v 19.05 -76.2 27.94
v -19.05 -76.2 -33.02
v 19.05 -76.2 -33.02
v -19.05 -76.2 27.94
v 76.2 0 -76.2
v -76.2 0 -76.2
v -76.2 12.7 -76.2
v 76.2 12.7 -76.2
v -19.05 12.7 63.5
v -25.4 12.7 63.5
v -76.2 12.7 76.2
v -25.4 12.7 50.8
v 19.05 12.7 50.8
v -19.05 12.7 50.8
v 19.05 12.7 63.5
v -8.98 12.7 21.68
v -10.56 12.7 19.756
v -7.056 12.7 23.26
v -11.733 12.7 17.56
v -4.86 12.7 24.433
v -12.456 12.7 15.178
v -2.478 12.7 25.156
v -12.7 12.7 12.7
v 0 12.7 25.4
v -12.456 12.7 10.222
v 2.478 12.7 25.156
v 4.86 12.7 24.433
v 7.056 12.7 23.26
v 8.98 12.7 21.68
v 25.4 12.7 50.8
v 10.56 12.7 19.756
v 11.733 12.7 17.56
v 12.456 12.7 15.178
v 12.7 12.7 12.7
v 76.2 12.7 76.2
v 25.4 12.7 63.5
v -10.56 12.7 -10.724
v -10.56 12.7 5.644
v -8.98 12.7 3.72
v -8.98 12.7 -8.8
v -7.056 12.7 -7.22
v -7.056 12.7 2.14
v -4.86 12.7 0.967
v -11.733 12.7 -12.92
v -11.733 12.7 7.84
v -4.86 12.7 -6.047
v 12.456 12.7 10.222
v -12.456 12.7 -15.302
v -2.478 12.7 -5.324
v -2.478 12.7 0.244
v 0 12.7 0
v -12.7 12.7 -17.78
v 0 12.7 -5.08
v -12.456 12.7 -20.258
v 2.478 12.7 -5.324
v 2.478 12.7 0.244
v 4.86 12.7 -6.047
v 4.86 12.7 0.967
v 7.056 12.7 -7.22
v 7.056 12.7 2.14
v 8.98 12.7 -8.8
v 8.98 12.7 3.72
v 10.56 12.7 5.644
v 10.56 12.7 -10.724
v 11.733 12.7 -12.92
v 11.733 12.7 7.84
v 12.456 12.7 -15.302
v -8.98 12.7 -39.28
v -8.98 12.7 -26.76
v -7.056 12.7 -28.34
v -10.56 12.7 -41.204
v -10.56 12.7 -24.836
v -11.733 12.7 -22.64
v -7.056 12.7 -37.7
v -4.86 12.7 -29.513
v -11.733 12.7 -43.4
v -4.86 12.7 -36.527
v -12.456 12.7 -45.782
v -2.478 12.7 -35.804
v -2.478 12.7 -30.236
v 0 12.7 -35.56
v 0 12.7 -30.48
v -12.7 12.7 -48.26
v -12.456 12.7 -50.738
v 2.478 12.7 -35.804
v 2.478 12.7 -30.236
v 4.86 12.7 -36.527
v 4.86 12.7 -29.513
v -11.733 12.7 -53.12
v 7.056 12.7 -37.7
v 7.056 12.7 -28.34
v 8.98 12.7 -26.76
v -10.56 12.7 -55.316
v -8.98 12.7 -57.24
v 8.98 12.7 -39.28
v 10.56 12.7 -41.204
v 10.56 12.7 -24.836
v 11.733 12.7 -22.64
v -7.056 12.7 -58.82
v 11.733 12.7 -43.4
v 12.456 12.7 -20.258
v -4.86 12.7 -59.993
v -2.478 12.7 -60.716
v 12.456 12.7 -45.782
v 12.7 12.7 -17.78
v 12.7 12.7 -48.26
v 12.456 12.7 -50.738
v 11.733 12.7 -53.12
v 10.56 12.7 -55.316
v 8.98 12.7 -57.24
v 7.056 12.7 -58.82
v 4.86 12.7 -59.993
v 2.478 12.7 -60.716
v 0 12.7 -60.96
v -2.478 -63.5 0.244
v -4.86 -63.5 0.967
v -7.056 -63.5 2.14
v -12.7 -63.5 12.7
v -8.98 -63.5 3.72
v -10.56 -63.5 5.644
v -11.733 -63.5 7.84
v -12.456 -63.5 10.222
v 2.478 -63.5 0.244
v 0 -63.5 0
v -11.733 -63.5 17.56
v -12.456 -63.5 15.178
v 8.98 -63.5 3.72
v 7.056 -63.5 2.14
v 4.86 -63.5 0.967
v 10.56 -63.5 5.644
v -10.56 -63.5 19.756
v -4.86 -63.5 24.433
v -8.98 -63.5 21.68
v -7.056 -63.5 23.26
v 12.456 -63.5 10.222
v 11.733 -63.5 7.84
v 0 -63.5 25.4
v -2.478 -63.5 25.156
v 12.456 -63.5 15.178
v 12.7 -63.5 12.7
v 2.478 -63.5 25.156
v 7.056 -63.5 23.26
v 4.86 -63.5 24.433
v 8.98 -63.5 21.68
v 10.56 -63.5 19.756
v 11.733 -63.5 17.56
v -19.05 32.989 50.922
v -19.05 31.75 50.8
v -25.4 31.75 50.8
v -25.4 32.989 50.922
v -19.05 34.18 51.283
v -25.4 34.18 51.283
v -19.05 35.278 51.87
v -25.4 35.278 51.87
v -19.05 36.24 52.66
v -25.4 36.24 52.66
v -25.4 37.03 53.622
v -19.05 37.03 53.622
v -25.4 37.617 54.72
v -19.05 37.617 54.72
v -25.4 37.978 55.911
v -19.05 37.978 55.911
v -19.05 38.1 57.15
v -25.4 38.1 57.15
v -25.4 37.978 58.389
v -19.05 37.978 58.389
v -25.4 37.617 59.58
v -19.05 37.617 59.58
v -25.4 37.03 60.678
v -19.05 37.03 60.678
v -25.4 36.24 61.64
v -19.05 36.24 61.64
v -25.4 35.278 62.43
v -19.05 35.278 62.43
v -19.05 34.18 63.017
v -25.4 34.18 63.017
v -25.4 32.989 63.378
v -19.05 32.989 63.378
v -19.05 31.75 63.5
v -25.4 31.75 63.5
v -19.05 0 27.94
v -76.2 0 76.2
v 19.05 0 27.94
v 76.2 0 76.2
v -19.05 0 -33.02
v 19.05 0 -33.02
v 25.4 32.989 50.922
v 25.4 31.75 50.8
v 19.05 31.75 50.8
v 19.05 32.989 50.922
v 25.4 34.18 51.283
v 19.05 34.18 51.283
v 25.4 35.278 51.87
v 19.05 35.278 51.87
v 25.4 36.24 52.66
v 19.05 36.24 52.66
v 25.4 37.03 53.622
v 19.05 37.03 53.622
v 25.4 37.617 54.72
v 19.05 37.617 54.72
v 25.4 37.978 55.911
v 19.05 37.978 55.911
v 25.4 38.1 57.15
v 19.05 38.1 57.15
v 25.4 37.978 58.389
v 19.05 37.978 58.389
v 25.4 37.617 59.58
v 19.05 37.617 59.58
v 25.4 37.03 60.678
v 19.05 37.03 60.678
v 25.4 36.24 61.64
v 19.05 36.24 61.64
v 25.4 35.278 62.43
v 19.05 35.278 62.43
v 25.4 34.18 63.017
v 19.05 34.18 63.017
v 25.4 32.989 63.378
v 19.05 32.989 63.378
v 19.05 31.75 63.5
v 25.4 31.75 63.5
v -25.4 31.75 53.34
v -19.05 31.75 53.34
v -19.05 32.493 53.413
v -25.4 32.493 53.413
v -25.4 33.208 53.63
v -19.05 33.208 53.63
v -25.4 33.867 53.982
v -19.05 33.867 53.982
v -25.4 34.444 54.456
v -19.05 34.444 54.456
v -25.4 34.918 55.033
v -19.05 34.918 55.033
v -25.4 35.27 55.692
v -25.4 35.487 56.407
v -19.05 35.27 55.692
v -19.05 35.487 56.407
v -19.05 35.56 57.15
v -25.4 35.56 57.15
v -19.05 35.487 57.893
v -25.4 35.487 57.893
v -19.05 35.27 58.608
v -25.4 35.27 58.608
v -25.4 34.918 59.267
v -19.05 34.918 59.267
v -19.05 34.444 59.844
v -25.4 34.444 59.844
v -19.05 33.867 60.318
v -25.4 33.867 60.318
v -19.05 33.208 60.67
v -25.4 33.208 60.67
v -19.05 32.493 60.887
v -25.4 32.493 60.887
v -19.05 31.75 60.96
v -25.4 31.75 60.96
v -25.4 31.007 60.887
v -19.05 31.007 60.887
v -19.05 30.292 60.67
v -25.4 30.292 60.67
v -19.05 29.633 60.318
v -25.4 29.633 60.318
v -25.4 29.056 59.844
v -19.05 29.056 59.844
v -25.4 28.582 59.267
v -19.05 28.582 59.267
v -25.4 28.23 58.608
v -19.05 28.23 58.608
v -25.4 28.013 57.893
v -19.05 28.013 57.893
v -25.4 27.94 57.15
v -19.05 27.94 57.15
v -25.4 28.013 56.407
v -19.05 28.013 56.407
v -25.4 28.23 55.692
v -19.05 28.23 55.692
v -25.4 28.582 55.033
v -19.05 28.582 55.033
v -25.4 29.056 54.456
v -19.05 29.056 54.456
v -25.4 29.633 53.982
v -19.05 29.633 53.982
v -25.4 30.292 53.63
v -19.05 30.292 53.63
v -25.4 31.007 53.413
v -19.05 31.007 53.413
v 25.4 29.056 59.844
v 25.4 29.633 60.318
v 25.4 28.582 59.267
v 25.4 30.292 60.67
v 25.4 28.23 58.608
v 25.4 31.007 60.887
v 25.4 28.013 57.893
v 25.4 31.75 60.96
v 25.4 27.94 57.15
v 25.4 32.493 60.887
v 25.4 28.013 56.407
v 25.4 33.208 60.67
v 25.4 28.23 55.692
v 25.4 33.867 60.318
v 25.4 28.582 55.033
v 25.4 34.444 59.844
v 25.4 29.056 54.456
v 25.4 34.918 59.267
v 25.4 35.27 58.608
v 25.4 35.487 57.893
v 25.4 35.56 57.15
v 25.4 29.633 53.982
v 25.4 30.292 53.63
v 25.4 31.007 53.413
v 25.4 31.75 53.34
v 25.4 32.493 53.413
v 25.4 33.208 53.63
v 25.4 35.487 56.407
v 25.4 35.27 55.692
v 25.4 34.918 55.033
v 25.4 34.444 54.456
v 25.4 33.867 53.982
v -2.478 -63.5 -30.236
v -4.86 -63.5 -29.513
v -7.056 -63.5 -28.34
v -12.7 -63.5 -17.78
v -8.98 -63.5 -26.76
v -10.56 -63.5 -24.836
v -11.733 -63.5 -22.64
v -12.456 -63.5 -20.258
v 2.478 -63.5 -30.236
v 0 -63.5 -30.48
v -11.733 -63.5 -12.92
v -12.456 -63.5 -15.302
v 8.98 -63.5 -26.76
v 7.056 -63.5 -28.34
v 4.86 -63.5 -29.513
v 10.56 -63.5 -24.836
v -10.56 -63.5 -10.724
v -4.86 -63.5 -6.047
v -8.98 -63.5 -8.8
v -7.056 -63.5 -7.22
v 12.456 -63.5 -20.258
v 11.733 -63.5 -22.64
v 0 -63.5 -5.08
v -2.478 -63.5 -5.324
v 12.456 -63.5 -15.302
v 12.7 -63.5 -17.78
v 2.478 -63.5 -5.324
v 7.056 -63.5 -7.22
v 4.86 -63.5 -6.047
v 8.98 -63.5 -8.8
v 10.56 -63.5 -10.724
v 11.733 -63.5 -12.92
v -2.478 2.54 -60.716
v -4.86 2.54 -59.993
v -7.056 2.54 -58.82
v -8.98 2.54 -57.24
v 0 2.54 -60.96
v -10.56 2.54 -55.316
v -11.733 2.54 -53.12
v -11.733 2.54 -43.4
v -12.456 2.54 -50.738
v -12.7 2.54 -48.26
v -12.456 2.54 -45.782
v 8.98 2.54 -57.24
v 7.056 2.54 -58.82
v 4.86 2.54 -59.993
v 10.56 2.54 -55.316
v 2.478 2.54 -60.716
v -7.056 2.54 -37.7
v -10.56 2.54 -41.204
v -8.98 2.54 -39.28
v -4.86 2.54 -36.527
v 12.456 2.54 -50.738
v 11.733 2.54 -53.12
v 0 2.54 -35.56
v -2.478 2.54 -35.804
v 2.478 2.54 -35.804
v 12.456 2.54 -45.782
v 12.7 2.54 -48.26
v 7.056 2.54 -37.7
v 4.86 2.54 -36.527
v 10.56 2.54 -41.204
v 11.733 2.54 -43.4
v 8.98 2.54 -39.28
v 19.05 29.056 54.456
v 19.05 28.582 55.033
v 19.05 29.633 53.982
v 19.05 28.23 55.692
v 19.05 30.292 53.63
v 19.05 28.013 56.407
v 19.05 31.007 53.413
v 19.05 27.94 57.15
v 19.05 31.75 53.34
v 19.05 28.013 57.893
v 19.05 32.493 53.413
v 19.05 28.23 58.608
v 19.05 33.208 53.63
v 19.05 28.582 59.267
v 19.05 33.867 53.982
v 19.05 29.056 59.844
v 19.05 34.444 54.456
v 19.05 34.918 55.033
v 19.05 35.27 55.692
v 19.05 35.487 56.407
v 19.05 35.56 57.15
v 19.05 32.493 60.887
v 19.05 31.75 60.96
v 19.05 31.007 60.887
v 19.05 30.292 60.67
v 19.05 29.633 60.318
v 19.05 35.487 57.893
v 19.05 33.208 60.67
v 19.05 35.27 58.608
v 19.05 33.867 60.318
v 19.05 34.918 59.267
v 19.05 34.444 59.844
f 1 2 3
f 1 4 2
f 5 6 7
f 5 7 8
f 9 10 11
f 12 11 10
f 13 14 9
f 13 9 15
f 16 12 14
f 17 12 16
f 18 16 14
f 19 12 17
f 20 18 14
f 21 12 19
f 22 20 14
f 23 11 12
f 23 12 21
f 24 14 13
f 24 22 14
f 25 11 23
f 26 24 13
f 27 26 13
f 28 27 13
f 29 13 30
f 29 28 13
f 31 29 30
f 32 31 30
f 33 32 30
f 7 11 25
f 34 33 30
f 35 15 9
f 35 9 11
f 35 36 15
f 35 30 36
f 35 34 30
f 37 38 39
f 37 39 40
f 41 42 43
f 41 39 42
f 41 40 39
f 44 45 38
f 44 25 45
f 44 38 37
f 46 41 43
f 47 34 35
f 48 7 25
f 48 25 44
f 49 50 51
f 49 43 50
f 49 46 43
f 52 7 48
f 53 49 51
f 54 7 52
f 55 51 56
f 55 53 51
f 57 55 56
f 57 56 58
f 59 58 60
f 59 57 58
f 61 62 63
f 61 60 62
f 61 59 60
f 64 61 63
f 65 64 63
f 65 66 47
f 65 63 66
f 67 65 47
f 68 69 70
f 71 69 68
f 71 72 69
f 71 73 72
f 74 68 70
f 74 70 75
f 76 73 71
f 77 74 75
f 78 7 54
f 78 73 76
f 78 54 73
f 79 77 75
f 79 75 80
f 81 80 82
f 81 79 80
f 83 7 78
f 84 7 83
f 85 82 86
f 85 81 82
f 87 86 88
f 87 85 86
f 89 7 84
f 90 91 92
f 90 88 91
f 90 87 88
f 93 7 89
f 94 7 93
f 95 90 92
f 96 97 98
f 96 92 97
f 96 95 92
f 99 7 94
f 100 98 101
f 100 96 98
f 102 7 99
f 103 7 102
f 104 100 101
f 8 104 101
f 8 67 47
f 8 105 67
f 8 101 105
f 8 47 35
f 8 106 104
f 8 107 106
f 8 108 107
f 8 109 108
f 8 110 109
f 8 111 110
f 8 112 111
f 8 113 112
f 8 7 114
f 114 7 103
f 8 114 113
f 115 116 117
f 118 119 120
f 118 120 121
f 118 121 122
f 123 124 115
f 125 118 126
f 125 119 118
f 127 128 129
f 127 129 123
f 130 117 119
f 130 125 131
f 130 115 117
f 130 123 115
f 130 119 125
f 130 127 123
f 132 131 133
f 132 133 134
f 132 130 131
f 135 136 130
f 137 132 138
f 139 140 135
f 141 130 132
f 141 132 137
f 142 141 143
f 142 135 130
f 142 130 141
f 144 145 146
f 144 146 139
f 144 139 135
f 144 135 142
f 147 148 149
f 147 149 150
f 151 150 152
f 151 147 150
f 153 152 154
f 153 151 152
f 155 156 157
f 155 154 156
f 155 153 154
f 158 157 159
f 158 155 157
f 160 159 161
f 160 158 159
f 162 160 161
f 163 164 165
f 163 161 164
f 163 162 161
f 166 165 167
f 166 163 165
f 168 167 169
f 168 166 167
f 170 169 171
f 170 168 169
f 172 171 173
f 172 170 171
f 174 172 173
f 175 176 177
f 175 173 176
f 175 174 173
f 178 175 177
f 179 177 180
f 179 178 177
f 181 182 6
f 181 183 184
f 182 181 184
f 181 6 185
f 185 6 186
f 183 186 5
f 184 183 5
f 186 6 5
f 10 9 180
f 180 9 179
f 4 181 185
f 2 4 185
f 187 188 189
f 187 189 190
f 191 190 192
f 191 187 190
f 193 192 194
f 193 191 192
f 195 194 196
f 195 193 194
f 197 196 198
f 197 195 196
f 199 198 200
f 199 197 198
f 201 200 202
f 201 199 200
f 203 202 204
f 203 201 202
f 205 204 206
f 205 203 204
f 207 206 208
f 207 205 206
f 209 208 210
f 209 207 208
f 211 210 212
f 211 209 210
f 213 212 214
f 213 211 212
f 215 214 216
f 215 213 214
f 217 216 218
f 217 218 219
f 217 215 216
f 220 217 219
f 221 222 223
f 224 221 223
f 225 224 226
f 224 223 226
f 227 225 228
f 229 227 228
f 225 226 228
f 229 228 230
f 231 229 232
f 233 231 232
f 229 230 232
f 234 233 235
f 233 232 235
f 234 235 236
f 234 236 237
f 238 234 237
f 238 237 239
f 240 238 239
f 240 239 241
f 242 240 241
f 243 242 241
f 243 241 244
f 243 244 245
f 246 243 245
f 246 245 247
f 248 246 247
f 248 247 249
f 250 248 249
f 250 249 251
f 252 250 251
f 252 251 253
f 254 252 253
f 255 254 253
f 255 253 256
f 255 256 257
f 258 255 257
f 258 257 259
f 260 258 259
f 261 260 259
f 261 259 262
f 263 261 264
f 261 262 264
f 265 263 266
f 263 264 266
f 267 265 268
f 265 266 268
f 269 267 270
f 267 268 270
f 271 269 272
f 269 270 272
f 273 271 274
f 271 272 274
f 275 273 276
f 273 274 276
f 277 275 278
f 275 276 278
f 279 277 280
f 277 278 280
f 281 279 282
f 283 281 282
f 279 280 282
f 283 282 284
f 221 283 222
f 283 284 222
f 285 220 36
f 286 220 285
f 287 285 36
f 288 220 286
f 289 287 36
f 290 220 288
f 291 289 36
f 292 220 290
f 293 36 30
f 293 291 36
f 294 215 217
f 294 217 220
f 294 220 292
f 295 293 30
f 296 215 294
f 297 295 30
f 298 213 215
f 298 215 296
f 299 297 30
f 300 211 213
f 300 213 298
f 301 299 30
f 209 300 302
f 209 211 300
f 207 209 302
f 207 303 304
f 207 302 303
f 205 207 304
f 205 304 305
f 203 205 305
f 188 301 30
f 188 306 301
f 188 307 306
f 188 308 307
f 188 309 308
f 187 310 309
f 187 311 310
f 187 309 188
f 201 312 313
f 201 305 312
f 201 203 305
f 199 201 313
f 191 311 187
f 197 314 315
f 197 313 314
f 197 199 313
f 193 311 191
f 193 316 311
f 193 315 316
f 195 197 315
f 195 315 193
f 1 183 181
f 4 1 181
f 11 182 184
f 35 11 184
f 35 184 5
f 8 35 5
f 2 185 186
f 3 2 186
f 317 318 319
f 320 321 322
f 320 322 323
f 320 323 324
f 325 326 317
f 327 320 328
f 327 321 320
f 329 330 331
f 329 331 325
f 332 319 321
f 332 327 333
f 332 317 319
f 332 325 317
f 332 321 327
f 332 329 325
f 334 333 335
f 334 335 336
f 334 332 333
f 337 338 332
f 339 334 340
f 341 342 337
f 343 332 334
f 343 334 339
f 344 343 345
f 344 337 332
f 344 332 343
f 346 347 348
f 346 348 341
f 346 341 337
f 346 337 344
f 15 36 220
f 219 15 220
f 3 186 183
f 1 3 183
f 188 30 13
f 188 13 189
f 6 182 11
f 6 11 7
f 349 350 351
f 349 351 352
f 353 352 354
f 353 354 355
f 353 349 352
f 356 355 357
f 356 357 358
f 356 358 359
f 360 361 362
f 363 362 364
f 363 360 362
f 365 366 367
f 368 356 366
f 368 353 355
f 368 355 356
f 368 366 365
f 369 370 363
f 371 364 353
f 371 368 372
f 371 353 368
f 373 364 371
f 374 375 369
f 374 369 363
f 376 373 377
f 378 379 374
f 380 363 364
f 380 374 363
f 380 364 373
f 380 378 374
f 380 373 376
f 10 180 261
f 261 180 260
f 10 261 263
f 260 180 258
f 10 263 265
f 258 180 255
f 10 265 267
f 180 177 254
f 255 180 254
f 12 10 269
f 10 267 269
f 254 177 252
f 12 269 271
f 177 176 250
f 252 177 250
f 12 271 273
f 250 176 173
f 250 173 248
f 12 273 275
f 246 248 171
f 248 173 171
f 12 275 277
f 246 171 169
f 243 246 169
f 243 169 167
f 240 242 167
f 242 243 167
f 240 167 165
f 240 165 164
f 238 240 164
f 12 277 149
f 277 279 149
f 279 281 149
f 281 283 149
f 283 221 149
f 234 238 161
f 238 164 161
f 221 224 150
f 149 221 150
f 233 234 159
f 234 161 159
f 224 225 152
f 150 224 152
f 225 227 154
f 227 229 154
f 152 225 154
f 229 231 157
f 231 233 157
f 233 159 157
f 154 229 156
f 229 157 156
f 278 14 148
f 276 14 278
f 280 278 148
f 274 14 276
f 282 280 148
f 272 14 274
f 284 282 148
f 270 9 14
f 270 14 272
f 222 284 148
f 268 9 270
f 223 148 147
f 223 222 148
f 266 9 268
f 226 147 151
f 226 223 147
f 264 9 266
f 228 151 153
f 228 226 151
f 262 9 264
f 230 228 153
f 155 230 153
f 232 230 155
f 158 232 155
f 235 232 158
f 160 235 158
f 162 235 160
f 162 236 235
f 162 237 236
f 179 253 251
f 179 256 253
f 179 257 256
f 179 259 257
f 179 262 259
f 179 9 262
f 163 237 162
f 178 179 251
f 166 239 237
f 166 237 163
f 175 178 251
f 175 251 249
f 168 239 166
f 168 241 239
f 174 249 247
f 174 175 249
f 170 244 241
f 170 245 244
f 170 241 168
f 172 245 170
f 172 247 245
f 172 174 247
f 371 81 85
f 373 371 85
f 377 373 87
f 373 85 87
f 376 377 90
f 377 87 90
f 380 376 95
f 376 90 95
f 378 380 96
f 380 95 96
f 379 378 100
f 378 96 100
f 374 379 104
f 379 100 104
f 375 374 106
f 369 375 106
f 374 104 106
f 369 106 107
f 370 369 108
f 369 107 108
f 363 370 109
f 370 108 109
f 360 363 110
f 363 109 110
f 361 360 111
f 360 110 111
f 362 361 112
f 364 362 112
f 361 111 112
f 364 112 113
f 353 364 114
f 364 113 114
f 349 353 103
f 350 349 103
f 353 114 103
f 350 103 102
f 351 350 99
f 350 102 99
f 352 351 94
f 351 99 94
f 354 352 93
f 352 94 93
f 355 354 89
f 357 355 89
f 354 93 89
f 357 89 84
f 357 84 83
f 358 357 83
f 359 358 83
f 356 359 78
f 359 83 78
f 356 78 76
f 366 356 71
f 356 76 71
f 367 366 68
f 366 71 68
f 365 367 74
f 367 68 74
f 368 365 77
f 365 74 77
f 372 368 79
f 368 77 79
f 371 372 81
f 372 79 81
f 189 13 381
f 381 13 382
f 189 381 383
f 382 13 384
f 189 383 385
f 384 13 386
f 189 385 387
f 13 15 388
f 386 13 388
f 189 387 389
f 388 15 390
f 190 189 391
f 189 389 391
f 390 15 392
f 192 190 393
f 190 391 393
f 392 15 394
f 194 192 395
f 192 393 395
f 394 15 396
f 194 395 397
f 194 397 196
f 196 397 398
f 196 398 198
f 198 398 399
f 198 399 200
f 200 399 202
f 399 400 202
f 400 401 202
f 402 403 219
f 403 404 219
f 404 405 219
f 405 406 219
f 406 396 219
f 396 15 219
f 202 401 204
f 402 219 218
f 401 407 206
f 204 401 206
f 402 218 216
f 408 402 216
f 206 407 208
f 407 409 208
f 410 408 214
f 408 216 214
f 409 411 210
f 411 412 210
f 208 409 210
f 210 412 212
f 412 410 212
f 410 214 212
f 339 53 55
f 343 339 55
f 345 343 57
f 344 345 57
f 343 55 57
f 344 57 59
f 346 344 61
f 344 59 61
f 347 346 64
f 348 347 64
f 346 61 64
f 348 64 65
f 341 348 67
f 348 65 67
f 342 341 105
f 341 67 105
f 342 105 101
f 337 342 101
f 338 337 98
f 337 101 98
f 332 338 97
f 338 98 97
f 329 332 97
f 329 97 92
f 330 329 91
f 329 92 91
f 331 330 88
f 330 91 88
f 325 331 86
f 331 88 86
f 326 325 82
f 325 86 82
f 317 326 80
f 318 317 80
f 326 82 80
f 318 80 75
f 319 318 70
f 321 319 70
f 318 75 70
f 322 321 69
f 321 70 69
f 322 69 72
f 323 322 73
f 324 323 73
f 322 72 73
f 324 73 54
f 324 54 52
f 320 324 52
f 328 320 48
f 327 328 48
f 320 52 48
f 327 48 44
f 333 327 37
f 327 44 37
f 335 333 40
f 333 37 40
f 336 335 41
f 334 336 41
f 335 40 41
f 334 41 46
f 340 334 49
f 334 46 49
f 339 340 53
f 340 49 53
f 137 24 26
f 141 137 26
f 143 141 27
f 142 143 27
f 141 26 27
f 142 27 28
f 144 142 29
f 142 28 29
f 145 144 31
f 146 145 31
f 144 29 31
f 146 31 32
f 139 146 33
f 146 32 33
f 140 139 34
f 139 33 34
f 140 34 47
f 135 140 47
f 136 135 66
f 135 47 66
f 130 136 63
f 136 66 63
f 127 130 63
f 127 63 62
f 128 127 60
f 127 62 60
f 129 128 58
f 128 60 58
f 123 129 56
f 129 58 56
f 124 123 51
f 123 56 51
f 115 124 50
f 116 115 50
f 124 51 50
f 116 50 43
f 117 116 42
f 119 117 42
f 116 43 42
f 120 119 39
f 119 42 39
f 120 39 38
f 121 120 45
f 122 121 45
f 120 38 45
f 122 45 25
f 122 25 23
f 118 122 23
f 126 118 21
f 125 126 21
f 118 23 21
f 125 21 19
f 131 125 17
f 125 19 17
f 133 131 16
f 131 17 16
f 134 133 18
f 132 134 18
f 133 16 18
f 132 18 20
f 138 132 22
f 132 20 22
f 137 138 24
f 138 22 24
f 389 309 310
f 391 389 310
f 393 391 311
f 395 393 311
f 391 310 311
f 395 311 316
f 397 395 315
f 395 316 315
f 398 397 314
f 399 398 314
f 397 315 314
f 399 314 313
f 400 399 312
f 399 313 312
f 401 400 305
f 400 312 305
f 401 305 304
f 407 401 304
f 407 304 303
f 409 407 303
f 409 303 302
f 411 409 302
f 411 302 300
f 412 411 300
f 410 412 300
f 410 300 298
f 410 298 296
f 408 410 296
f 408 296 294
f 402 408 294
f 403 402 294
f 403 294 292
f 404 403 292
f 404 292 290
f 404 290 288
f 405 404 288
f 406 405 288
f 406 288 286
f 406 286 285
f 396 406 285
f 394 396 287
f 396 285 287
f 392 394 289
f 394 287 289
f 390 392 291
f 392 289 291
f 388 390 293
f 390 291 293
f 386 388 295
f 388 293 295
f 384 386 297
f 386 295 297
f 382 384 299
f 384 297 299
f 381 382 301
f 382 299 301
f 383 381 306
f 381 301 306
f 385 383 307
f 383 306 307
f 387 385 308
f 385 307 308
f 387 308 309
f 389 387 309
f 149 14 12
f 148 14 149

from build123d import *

# Parameters (mm, degrees)
SKETCH1_W           = 152.4
SKETCH1_H           = 152.4
BOSS_EXTRUDE1_DEPTH = 12.7
SKETCH2_W           = 12.7
SKETCH2_H           = 25.4
BOSS_EXTRUDE2_DEPTH = 25.4
FILLET1_RADIUS      = 6.35
FILLET1_LENGTH      = 50.8
SKETCH3_W           = 38.1
SKETCH3_H           = 35.536125939
CUT_EXTRUDE1_DEPTH  = 50.8
SKETCH4_R           = 3.81
CUT_EXTRUDE2_DEPTH  = 50.8
SKETCH11_W          = 19.05
SKETCH11_H          = 30.48
BOSS_EXTRUDE6_DEPTH = 76.2
SKETCH14_R          = 12.7
CUT_EXTRUDE3_DEPTH  = 76.2
SKETCH14_3_R        = 12.7
CUT_EXTRUDE4_DEPTH  = 10.16


with BuildPart() as part:
    # Sketch1 → Boss-Extrude1 (new body)
    with BuildSketch(Plane(origin=(0, 0, 0), x_dir=(1, 0, 0), z_dir=(0, 1, 0))):
        Rectangle(SKETCH1_W, SKETCH1_H)
    extrude(amount=BOSS_EXTRUDE1_DEPTH)

    # Sketch2 → Boss-Extrude2 (add, symmetric)
    with BuildSketch(Plane(origin=(0, 0, 0), x_dir=(0, 0, -1), z_dir=(1, 0, 0))):
        with Locations((-57.15, 25.4)):
            Rectangle(SKETCH2_W, SKETCH2_H)
    extrude(amount=BOSS_EXTRUDE2_DEPTH, both=True)

    # Fillet1: full round fillet: the end face becomes a half cylinder, R = half its width
    fillet1_face = Plane((0, 38.1, 57.15), x_dir=(1, 0, 0), z_dir=(0, 1, 0))  # on the end face: x along it, z out of the body
    fillet1_slab = fillet1_face.offset(-FILLET1_RADIUS / 2) * Box(FILLET1_LENGTH, 2 * FILLET1_RADIUS, FILLET1_RADIUS, mode=Mode.PRIVATE)  # the body's end, R deep
    fillet1_round = Plane((0, 31.75, 57.15), x_dir=(0, 1, 0), z_dir=(1, 0, 0)) * Cylinder(FILLET1_RADIUS, FILLET1_LENGTH, mode=Mode.PRIVATE)  # its axis R under the face
    add(fillet1_slab - fillet1_round, mode=Mode.SUBTRACT)

    # Sketch3 → Cut-Extrude1 (cut)
    with BuildSketch(Plane.XY.offset(63.5)):
        with Locations((0, 30.46806297)):
            Rectangle(SKETCH3_W, SKETCH3_H)
    extrude(amount=-CUT_EXTRUDE1_DEPTH, mode=Mode.SUBTRACT)

    # Sketch4 → Cut-Extrude2 (cut)
    with BuildSketch(Plane(origin=(25.4, 0, 0), x_dir=(0, 0, -1), z_dir=(1, 0, 0))):
        with Locations((-57.15, 31.75)):
            Circle(SKETCH4_R)
    extrude(amount=-CUT_EXTRUDE2_DEPTH, mode=Mode.SUBTRACT)

    # Sketch11 → Boss-Extrude6 (add)
    with BuildSketch(Plane.XZ):
        with Locations((-9.525, -17.78)):
            Rectangle(SKETCH11_W, SKETCH11_H)
        with Locations((9.525, -17.78)):
            Rectangle(SKETCH11_W, SKETCH11_H)
        with Locations((9.525, 12.7)):
            Rectangle(SKETCH11_W, SKETCH11_H)
        with Locations((-9.525, 12.7)):
            Rectangle(SKETCH11_W, SKETCH11_H)
    extrude(amount=BOSS_EXTRUDE6_DEPTH)

    # Sketch14 → Cut-Extrude3 (cut)
    with BuildSketch(Plane(origin=(0, 12.7, 0), x_dir=(1, 0, 0), z_dir=(0, 1, 0))):
        with Locations(Location((0, 17.78, 0), (0, 0, 270))):
            Circle(SKETCH14_R)
        with Locations(Location((0, -12.7, 0), (0, 0, 270))):
            Circle(SKETCH14_R)
    extrude(amount=-CUT_EXTRUDE3_DEPTH, mode=Mode.SUBTRACT)

    # Sketch14<3> → Cut-Extrude4 (cut)
    with BuildSketch(Plane(origin=(0, 12.7, 0), x_dir=(1, 0, 0), z_dir=(0, 1, 0))):
        with Locations(Location((0, 48.26, 0), (0, 0, 270))):
            Circle(SKETCH14_3_R)
    extrude(amount=-CUT_EXTRUDE4_DEPTH, mode=Mode.SUBTRACT)


solid = part.part
